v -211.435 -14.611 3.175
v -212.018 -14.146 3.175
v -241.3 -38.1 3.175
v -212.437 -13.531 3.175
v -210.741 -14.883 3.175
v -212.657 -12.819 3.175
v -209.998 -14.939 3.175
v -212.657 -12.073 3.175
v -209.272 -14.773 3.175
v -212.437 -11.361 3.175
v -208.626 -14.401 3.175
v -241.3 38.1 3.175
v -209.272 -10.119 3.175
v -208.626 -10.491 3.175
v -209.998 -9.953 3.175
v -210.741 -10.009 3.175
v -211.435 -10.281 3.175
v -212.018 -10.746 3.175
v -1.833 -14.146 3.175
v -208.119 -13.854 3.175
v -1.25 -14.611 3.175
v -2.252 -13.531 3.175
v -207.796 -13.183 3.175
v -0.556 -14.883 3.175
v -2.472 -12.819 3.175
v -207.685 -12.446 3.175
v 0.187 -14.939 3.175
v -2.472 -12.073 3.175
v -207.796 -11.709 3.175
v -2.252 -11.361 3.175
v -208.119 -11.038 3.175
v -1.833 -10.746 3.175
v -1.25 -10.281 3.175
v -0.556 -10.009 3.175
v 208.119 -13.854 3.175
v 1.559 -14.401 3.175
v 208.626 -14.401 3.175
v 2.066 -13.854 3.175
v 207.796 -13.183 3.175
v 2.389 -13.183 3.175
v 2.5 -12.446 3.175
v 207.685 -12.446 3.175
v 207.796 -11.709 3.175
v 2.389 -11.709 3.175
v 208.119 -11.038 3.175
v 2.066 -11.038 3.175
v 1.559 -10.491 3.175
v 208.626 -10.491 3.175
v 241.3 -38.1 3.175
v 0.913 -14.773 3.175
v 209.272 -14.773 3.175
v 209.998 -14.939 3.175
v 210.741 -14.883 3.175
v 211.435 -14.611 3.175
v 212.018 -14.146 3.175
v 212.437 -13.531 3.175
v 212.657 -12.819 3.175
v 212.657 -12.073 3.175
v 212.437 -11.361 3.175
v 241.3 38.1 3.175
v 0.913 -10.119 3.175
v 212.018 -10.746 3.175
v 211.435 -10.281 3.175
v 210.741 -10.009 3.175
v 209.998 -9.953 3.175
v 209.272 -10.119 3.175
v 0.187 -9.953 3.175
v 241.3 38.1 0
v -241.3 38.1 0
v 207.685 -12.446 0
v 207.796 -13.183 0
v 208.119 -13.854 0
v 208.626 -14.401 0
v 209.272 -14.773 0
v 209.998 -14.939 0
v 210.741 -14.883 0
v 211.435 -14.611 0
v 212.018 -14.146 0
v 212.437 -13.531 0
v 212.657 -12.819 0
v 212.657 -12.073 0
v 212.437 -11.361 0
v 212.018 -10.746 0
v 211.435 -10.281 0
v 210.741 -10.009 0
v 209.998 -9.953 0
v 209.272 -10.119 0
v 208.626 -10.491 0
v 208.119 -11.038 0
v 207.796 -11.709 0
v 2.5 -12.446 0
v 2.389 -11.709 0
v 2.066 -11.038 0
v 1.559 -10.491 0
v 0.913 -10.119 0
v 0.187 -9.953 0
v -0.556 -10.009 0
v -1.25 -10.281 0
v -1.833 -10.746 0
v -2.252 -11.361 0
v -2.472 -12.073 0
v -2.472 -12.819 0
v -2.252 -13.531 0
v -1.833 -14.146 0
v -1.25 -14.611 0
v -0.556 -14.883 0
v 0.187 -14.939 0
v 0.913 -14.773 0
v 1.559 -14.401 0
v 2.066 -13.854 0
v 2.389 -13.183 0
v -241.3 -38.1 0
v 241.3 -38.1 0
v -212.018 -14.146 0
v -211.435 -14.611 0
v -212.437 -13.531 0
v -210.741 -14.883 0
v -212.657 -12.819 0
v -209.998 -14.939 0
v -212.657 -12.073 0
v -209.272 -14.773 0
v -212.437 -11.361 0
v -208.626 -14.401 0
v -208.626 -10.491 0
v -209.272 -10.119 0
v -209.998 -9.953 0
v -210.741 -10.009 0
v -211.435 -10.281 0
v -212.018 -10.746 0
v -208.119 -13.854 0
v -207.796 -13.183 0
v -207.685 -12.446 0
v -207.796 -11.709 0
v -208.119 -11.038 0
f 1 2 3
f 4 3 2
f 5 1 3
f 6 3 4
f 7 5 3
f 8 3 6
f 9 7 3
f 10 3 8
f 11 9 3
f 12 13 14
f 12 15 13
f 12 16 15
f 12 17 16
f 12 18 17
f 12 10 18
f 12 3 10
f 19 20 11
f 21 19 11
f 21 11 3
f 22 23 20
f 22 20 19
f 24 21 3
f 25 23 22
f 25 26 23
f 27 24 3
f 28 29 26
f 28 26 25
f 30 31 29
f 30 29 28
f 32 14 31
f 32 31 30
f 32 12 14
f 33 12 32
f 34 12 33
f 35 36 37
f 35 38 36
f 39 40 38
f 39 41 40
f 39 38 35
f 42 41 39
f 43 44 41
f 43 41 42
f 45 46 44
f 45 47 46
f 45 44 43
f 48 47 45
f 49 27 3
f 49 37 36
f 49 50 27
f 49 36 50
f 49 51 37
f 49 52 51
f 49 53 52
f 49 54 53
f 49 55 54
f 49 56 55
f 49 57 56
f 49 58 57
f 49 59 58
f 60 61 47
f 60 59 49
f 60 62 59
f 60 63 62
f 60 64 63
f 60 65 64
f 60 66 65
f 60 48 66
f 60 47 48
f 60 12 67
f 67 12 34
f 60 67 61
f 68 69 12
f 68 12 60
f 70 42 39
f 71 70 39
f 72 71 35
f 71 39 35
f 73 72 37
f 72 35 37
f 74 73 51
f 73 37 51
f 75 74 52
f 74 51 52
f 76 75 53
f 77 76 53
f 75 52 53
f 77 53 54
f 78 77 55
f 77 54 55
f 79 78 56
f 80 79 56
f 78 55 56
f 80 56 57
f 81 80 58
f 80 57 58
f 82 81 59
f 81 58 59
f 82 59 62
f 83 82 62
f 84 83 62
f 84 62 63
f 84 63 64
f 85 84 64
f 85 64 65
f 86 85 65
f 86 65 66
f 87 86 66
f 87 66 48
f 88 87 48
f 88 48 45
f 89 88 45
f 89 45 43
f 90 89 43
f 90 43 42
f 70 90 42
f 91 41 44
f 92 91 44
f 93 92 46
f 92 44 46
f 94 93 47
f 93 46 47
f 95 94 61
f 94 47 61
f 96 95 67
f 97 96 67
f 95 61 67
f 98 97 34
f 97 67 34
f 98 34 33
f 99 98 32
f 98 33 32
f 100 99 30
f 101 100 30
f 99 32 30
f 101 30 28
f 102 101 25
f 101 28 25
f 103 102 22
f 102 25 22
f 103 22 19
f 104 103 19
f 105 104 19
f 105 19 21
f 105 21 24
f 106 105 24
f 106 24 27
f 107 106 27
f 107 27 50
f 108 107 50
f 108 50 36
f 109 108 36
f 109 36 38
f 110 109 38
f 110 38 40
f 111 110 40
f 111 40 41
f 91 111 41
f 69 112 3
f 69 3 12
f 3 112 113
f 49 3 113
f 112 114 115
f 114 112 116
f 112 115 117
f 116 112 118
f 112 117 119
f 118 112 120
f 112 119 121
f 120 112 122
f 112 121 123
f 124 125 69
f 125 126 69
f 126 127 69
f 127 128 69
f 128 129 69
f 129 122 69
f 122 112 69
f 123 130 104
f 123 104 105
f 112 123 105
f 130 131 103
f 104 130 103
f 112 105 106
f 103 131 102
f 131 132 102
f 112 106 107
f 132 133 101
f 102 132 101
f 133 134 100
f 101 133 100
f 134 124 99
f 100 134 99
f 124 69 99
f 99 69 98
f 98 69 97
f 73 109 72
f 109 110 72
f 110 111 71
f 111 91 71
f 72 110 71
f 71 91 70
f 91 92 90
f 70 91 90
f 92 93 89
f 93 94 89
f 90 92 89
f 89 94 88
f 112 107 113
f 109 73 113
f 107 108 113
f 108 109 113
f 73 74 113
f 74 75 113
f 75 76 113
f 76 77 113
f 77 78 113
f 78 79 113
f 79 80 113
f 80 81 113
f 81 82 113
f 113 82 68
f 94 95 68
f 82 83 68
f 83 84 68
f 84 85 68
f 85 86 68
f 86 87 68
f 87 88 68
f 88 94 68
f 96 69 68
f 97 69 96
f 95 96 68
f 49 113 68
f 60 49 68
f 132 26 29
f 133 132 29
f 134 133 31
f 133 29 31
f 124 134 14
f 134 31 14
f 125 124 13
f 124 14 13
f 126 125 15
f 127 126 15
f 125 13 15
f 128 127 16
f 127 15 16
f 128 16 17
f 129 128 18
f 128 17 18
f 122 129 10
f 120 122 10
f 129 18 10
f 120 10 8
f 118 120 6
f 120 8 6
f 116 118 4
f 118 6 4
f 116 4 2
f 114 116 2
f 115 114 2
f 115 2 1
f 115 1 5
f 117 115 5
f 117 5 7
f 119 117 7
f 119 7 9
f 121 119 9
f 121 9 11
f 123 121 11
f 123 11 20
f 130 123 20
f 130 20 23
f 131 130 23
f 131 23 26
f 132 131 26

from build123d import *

# Parameters (mm, degrees)
SKETCH1_W           = 482.6
SKETCH1_H           = 76.2
BOSS_EXTRUDE1_DEPTH = 3.175
SKETCH2_R           = 2.5
CUT_EXTRUDE1_DEPTH  = 245.310009261


with BuildPart() as part:
    # Sketch1 → Boss-Extrude1 (new body)
    with BuildSketch(Plane.XY):
        Rectangle(SKETCH1_W, SKETCH1_H)
    extrude(amount=BOSS_EXTRUDE1_DEPTH)

    # Sketch2 → Cut-Extrude1 (cut, through all)
    with BuildSketch(Plane.XY.offset(3.175)):
        with Locations((-210.185, -12.446)):
            Circle(SKETCH2_R)
        with Locations(Location((210.185, -12.446, 0), (0, 0, 180))):
            Circle(SKETCH2_R)
        with Locations((0, -12.446)):
            Circle(SKETCH2_R)
    extrude(amount=-CUT_EXTRUDE1_DEPTH, mode=Mode.SUBTRACT)


solid = part.part
